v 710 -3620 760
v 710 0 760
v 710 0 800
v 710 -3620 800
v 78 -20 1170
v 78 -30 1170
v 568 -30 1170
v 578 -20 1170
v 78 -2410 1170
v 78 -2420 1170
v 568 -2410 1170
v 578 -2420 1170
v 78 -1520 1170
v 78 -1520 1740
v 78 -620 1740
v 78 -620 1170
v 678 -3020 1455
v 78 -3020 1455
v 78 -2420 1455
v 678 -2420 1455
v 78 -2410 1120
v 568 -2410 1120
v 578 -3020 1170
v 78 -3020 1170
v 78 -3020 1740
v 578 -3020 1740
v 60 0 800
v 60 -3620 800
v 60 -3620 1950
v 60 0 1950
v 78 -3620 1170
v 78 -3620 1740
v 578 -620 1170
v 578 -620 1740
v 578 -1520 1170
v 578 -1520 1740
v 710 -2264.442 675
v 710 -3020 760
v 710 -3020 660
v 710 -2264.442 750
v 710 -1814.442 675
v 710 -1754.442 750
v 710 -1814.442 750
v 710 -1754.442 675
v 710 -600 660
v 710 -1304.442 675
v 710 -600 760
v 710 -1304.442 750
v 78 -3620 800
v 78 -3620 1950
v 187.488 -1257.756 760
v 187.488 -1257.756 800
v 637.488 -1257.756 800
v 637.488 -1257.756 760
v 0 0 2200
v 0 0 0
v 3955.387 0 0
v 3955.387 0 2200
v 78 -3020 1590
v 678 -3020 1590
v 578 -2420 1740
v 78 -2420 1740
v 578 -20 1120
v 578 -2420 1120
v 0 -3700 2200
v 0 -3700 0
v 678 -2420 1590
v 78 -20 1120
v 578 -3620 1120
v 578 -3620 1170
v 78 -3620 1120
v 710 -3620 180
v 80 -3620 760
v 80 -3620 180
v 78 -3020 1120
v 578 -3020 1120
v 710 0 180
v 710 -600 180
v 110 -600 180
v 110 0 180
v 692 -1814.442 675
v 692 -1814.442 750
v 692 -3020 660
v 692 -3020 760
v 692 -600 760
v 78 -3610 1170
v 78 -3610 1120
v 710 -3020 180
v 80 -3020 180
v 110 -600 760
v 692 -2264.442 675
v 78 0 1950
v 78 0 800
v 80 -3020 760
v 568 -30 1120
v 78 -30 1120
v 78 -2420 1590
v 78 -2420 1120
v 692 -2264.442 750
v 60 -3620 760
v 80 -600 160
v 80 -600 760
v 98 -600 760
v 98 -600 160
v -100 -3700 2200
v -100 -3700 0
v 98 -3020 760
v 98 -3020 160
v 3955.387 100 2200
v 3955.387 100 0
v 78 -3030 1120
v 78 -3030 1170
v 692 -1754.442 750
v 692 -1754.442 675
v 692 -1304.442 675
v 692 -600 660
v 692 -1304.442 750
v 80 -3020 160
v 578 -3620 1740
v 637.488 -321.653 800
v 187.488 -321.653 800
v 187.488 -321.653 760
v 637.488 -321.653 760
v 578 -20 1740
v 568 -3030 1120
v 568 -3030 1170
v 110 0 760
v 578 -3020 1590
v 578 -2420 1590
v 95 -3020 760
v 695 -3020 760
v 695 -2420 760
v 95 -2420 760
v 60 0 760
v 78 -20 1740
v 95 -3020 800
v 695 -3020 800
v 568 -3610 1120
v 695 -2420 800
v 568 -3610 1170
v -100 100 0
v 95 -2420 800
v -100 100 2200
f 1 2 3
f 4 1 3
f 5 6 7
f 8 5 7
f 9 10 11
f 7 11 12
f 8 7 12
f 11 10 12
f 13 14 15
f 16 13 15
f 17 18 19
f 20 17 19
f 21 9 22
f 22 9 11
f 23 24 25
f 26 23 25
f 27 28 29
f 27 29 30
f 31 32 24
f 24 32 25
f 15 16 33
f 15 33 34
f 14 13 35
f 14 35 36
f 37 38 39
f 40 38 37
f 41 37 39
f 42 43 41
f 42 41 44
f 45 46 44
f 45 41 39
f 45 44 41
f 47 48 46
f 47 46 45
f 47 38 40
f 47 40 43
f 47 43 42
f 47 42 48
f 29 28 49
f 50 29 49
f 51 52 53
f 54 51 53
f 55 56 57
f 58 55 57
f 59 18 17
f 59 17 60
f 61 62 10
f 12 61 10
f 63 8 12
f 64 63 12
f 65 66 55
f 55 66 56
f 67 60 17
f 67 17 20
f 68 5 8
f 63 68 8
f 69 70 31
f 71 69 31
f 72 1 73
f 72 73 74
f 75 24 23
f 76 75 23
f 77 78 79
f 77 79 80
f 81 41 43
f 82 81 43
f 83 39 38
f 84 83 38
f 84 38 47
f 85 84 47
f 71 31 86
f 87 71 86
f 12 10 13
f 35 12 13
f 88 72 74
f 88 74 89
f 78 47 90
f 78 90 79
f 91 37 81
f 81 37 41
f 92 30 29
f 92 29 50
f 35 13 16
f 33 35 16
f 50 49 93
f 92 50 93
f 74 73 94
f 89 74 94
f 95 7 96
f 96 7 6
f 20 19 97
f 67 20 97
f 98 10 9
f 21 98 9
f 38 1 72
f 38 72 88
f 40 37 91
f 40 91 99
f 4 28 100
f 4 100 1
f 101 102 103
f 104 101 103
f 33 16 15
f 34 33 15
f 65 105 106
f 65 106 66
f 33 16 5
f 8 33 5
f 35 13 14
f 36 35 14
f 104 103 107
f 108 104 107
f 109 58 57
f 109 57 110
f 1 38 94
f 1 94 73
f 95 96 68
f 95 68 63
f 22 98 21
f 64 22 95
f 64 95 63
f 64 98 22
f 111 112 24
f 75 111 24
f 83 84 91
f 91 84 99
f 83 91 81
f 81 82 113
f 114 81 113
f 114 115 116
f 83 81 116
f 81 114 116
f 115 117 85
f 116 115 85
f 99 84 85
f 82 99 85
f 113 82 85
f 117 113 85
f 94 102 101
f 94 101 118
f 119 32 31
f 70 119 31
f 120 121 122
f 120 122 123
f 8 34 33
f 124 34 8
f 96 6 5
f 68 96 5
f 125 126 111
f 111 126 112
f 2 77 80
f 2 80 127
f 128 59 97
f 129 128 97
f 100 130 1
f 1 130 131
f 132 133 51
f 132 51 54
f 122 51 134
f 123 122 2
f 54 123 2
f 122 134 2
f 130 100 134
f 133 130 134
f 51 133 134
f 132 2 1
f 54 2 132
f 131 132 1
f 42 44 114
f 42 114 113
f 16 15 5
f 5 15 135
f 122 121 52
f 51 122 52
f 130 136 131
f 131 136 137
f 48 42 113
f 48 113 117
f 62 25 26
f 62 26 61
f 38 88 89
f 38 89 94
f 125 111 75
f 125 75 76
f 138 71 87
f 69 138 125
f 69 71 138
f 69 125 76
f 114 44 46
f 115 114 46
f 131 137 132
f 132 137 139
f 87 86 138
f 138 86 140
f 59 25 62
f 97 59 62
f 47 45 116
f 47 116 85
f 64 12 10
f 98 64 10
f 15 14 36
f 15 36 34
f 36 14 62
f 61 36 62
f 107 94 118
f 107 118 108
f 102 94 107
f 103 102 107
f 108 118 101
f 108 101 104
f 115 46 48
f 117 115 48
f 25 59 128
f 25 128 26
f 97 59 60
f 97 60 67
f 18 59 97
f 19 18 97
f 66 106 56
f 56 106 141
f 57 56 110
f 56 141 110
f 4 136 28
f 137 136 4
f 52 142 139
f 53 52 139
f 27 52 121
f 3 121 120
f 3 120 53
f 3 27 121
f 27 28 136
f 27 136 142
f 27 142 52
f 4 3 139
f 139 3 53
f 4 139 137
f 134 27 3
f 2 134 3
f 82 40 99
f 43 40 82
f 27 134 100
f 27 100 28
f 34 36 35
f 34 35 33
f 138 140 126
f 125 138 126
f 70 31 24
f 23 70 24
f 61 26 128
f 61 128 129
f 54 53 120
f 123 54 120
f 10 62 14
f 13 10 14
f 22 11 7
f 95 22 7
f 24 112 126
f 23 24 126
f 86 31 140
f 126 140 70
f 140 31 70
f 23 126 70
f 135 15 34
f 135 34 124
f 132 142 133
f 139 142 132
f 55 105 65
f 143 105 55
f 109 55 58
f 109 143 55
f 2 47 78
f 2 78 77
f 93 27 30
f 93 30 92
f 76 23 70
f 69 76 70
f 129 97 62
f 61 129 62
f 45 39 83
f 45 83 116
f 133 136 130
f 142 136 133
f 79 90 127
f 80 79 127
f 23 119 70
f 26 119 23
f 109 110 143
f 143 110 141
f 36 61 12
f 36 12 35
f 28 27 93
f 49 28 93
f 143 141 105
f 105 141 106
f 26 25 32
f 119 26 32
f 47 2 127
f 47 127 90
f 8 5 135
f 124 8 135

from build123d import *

# Parameters (mm, degrees)
F0_W      = 100
F0_H      = 3700
F1_DEPTH  = 2200
F2_W      = 650
F2_H      = 40
F3_DEPTH  = 3620
F4_W      = 18
F4_H      = 3620
F5_DEPTH  = 1150
F7_DEPTH  = 500
F6_W      = 900
F6_H      = 570
F8_DEPTH  = 500
F9_DEPTH  = 500
F6_W_2    = 600
F10_DEPTH = 500
F12_DEPTH = 630
F13_DEPTH = 600
F11_W     = 2420
F11_H     = 100
F14_DEPTH = 18
F15_W     = 18
F15_H     = 2420
F16_DEPTH = 600
F6_H_2    = 150
F17_DEPTH = 500
F6_H_3    = 135
F18_DEPTH = 600
F20_DEPTH = 50
F22_DEPTH = 50
F23_W     = 450
F23_H     = 75
F24_DEPTH = 25
F25_W     = 600
F25_H     = 600
F25_W_2   = 450
F25_H_2   = 450
F25_H_3   = 36.1033052649
F26_DEPTH = 50


with BuildPart() as f1:
    # F0 (on Top) → F1 (new body)
    with BuildSketch(Plane.XY):
        with Locations((-50, -1850)):
            Rectangle(F0_W, F0_H)
        Polygon((-100, 0), (0, 0), (3955.3870921059, 0), (3955.3870921059, 100), (-100, 100), align=None)
    extrude(amount=F1_DEPTH)


with BuildPart() as f3:
    # F2 (on face) → F3 (new body)
    with BuildSketch(Plane.XZ):
        with Locations((385, 780)):
            Rectangle(F2_W, F2_H)
    extrude(amount=F3_DEPTH)

    # F25 (on face) → F26 (cut)
    with BuildSketch(Plane.XY.offset(800)):
        with Locations((395, -2720)):
            Rectangle(F25_W, F25_H)
        with Locations((412.4879837036, -1032.7558462404)):
            Rectangle(F25_W_2, F25_H_2)
        with Locations((412.4879837036, -789.7041936079)):
            Rectangle(F25_W_2, F25_H_3)
        with Locations((412.4879837036, -546.6525409754)):
            Rectangle(F25_W_2, F25_H_2)
    extrude(amount=-F26_DEPTH, mode=Mode.SUBTRACT)


with BuildPart() as f5:
    # F4 (on face) → F5 (new body)
    with BuildSketch(Plane.XY.offset(800)):
        with Locations((69, -1810)):
            Rectangle(F4_W, F4_H)
    extrude(amount=F5_DEPTH)


with BuildPart() as f7:
    # F6 (on face) → F7 (new body)
    with BuildSketch(Plane.YZ.offset(78)):
        Polygon((-3020, 1740), (-3620, 1740), (-3620, 1170), (-3020, 1170), (-3020, 1455), (-3020, 1590), align=None)
    extrude(amount=F7_DEPTH)


with BuildPart() as f8:
    # F6 (on face) → F8 (new body)
    with BuildSketch(Plane.YZ.offset(78)):
        with Locations((-1070, 1455)):
            Rectangle(F6_W, F6_H)
    extrude(amount=F8_DEPTH)


with BuildPart() as f9:
    # F6 (on face) → F9 (new body)
    with BuildSketch(Plane.YZ.offset(78)):
        Polygon((-1520, 1740), (-2420, 1740), (-2420, 1590), (-2420, 1455), (-2420, 1170), (-1520, 1170), align=None)
    extrude(amount=F9_DEPTH)


with BuildPart() as f10:
    # F6 (on face) → F10 (new body)
    with BuildSketch(Plane.YZ.offset(78)):
        with Locations((-320, 1455)):
            Rectangle(F6_W_2, F6_H)
    extrude(amount=F10_DEPTH)


with BuildPart() as f12:
    # F11 (on face) → F12 (new body)
    with BuildSketch(Plane.YZ.offset(710)):
        Polygon((-3020, 760), (-3620, 760), (-3620, 180), (-3020, 180), (-3020, 660), align=None)
    extrude(amount=-F12_DEPTH)


with BuildPart() as f13:
    # F11 (on face) → F13 (new body)
    with BuildSketch(Plane.YZ.offset(710)):
        Polygon((0, 760), (-600, 760), (-600, 660), (-600, 180), (0, 180), align=None)
    extrude(amount=-F13_DEPTH)


with BuildPart() as f14:
    # F11 (on face) → F14 (new body)
    with BuildSketch(Plane.YZ.offset(710)):
        with Locations((-1810, 710)):
            Rectangle(F11_W, F11_H)
    extrude(amount=-F14_DEPTH)

    # F23 (on face) → F24 (cut)
    with BuildSketch(Plane.YZ.offset(710)):
        with Locations((-1529.4419670105, 712.5)):
            Rectangle(F23_W, F23_H)
        with Locations((-2039.4419670105, 712.5)):
            Rectangle(F23_W, F23_H)
    extrude(amount=-F24_DEPTH, mode=Mode.SUBTRACT)


with BuildPart() as f16:
    # F15 (on face) → F16 (new body)
    with BuildSketch(Plane(origin=(0, 0, 760), x_dir=(1, 0, 0), z_dir=(0, 0, -1))):
        with Locations((89, 1810)):
            Rectangle(F15_W, F15_H)
    extrude(amount=F16_DEPTH)


with BuildPart() as f17:
    # F6 (on face) → F17 (new body)
    with BuildSketch(Plane.YZ.offset(78)):
        with Locations((-2720, 1665)):
            Rectangle(F6_W_2, F6_H_2)
    extrude(amount=F17_DEPTH)


with BuildPart() as f18:
    # F6 (on face) → F18 (new body)
    with BuildSketch(Plane.YZ.offset(78)):
        with Locations((-2720, 1522.5)):
            Rectangle(F6_W_2, F6_H_3)
    extrude(amount=F18_DEPTH)


with BuildPart() as f20:
    # F19 (on face) → F20 (new body)
    with BuildSketch(Plane(origin=(0, 0, 1170), x_dir=(1, 0, 0), z_dir=(0, 0, -1))):
        Polygon((578, 3620), (78, 3620), (78, 3610), (568, 3610), (568, 3030), (78, 3030), (78, 3020), (578, 3020), align=None)
    extrude(amount=F20_DEPTH)


with BuildPart() as f22:
    # F21 (on face) → F22 (new body)
    with BuildSketch(Plane(origin=(0, 0, 1170), x_dir=(1, 0, 0), z_dir=(0, 0, -1))):
        Polygon((578, 2420), (78, 2420), (78, 2410), (568, 2410), (568, 30), (78, 30), (78, 20), (578, 20), align=None)
    extrude(amount=F22_DEPTH)


solid = Compound([f1.part, f3.part, f5.part, f7.part, f8.part, f9.part, f10.part, f12.part, f13.part, f14.part, f16.part, f17.part, f18.part, f20.part, f22.part])
